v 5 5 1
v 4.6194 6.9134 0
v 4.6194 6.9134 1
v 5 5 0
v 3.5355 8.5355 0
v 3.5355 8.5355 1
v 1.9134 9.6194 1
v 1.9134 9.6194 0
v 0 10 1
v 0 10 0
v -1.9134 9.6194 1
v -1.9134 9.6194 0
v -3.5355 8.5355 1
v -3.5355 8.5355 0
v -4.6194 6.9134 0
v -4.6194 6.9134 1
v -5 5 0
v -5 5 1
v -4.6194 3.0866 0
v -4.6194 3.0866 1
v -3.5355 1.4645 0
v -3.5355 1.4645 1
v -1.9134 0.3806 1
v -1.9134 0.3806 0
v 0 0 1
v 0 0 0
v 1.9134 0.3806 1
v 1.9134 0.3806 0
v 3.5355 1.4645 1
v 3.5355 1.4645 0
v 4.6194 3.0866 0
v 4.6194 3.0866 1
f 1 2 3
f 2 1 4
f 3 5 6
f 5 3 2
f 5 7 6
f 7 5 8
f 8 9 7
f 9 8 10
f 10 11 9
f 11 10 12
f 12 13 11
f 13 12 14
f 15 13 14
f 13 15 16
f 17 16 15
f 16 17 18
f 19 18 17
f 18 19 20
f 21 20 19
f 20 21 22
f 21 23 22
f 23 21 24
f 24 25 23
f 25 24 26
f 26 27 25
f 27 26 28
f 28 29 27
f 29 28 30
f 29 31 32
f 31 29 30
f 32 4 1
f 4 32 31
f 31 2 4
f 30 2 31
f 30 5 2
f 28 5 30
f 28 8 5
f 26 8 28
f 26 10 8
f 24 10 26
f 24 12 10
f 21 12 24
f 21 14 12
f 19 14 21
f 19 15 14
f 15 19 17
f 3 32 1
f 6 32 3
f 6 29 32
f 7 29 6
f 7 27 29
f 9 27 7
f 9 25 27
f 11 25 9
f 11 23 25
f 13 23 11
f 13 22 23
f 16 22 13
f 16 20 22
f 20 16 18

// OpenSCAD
// file: base3d.scad
module xyzCube(c, x, y, z)
{
    color(c) cube([x, y, z], false);
}

module transCube(c, xOffset, yOffset, zOffset, x, y, z)
{
    translate([xOffset, yOffset, zOffset]) xyzCube(c, x, y, z);
}

module rotCube(c, rotX, rotY, rotZ, xO, yO, zO, x, y, z)
{
    rotate([rotX, rotY, rotZ]) transCube(c, xO, yO, zO, x, y, z);
}
//rotCube("yellow", 0,0,0, 0,0,0, 2, 3, 4);
//rotCube("green", 10, 20, 30, 4, 3, 1, 5, 6, 7);


module rhCentCylinder(c, rRadius, z)
{
    color(c) cylinder(h=z, r=rRadius, false);
}
//rhCentCylinder("red", 3, 2);

module rhCylinder(c, rRadius, z)
{
    translate([rRadius, rRadius, 0]) rhCentCylinder(c, rRadius, z);
}
//rhCylinder("red", 3, 2);

module transCylinder(c, xO, yO, zO, rRadius, z)
{
    translate([xO, yO, zO]) rhCylinder(c, rRadius, z);
}
//transCylinder("green", -10, 10, 4, 3, 2);

module rotCylinder(c, rotZ, xO, yO, zO, rRadius, z)
{
    rotate([0, 0, rotZ]) transCylinder(c, xO, yO, zO, rRadius, z);
}
rotCylinder("orange", 90, 3, 3, 3, 4, 5);
// main file
// Copyright Stephen Morrisson 2017

use <base3d.scad>


// Right side of cylinder
module rhHalfCylinder(c, rRadius, z)
{
    negR = -1.0 * rRadius;
    rD = rRadius * 2.0;
    difference()
    {
        transCylinder(c, negR, 0, 0, rRadius, z);
        //translate([-rD, 0, -z]) cube(rD, rD, z * 3.0);  
    }
}
rhHalfCylinder("red", 5, 3); 
